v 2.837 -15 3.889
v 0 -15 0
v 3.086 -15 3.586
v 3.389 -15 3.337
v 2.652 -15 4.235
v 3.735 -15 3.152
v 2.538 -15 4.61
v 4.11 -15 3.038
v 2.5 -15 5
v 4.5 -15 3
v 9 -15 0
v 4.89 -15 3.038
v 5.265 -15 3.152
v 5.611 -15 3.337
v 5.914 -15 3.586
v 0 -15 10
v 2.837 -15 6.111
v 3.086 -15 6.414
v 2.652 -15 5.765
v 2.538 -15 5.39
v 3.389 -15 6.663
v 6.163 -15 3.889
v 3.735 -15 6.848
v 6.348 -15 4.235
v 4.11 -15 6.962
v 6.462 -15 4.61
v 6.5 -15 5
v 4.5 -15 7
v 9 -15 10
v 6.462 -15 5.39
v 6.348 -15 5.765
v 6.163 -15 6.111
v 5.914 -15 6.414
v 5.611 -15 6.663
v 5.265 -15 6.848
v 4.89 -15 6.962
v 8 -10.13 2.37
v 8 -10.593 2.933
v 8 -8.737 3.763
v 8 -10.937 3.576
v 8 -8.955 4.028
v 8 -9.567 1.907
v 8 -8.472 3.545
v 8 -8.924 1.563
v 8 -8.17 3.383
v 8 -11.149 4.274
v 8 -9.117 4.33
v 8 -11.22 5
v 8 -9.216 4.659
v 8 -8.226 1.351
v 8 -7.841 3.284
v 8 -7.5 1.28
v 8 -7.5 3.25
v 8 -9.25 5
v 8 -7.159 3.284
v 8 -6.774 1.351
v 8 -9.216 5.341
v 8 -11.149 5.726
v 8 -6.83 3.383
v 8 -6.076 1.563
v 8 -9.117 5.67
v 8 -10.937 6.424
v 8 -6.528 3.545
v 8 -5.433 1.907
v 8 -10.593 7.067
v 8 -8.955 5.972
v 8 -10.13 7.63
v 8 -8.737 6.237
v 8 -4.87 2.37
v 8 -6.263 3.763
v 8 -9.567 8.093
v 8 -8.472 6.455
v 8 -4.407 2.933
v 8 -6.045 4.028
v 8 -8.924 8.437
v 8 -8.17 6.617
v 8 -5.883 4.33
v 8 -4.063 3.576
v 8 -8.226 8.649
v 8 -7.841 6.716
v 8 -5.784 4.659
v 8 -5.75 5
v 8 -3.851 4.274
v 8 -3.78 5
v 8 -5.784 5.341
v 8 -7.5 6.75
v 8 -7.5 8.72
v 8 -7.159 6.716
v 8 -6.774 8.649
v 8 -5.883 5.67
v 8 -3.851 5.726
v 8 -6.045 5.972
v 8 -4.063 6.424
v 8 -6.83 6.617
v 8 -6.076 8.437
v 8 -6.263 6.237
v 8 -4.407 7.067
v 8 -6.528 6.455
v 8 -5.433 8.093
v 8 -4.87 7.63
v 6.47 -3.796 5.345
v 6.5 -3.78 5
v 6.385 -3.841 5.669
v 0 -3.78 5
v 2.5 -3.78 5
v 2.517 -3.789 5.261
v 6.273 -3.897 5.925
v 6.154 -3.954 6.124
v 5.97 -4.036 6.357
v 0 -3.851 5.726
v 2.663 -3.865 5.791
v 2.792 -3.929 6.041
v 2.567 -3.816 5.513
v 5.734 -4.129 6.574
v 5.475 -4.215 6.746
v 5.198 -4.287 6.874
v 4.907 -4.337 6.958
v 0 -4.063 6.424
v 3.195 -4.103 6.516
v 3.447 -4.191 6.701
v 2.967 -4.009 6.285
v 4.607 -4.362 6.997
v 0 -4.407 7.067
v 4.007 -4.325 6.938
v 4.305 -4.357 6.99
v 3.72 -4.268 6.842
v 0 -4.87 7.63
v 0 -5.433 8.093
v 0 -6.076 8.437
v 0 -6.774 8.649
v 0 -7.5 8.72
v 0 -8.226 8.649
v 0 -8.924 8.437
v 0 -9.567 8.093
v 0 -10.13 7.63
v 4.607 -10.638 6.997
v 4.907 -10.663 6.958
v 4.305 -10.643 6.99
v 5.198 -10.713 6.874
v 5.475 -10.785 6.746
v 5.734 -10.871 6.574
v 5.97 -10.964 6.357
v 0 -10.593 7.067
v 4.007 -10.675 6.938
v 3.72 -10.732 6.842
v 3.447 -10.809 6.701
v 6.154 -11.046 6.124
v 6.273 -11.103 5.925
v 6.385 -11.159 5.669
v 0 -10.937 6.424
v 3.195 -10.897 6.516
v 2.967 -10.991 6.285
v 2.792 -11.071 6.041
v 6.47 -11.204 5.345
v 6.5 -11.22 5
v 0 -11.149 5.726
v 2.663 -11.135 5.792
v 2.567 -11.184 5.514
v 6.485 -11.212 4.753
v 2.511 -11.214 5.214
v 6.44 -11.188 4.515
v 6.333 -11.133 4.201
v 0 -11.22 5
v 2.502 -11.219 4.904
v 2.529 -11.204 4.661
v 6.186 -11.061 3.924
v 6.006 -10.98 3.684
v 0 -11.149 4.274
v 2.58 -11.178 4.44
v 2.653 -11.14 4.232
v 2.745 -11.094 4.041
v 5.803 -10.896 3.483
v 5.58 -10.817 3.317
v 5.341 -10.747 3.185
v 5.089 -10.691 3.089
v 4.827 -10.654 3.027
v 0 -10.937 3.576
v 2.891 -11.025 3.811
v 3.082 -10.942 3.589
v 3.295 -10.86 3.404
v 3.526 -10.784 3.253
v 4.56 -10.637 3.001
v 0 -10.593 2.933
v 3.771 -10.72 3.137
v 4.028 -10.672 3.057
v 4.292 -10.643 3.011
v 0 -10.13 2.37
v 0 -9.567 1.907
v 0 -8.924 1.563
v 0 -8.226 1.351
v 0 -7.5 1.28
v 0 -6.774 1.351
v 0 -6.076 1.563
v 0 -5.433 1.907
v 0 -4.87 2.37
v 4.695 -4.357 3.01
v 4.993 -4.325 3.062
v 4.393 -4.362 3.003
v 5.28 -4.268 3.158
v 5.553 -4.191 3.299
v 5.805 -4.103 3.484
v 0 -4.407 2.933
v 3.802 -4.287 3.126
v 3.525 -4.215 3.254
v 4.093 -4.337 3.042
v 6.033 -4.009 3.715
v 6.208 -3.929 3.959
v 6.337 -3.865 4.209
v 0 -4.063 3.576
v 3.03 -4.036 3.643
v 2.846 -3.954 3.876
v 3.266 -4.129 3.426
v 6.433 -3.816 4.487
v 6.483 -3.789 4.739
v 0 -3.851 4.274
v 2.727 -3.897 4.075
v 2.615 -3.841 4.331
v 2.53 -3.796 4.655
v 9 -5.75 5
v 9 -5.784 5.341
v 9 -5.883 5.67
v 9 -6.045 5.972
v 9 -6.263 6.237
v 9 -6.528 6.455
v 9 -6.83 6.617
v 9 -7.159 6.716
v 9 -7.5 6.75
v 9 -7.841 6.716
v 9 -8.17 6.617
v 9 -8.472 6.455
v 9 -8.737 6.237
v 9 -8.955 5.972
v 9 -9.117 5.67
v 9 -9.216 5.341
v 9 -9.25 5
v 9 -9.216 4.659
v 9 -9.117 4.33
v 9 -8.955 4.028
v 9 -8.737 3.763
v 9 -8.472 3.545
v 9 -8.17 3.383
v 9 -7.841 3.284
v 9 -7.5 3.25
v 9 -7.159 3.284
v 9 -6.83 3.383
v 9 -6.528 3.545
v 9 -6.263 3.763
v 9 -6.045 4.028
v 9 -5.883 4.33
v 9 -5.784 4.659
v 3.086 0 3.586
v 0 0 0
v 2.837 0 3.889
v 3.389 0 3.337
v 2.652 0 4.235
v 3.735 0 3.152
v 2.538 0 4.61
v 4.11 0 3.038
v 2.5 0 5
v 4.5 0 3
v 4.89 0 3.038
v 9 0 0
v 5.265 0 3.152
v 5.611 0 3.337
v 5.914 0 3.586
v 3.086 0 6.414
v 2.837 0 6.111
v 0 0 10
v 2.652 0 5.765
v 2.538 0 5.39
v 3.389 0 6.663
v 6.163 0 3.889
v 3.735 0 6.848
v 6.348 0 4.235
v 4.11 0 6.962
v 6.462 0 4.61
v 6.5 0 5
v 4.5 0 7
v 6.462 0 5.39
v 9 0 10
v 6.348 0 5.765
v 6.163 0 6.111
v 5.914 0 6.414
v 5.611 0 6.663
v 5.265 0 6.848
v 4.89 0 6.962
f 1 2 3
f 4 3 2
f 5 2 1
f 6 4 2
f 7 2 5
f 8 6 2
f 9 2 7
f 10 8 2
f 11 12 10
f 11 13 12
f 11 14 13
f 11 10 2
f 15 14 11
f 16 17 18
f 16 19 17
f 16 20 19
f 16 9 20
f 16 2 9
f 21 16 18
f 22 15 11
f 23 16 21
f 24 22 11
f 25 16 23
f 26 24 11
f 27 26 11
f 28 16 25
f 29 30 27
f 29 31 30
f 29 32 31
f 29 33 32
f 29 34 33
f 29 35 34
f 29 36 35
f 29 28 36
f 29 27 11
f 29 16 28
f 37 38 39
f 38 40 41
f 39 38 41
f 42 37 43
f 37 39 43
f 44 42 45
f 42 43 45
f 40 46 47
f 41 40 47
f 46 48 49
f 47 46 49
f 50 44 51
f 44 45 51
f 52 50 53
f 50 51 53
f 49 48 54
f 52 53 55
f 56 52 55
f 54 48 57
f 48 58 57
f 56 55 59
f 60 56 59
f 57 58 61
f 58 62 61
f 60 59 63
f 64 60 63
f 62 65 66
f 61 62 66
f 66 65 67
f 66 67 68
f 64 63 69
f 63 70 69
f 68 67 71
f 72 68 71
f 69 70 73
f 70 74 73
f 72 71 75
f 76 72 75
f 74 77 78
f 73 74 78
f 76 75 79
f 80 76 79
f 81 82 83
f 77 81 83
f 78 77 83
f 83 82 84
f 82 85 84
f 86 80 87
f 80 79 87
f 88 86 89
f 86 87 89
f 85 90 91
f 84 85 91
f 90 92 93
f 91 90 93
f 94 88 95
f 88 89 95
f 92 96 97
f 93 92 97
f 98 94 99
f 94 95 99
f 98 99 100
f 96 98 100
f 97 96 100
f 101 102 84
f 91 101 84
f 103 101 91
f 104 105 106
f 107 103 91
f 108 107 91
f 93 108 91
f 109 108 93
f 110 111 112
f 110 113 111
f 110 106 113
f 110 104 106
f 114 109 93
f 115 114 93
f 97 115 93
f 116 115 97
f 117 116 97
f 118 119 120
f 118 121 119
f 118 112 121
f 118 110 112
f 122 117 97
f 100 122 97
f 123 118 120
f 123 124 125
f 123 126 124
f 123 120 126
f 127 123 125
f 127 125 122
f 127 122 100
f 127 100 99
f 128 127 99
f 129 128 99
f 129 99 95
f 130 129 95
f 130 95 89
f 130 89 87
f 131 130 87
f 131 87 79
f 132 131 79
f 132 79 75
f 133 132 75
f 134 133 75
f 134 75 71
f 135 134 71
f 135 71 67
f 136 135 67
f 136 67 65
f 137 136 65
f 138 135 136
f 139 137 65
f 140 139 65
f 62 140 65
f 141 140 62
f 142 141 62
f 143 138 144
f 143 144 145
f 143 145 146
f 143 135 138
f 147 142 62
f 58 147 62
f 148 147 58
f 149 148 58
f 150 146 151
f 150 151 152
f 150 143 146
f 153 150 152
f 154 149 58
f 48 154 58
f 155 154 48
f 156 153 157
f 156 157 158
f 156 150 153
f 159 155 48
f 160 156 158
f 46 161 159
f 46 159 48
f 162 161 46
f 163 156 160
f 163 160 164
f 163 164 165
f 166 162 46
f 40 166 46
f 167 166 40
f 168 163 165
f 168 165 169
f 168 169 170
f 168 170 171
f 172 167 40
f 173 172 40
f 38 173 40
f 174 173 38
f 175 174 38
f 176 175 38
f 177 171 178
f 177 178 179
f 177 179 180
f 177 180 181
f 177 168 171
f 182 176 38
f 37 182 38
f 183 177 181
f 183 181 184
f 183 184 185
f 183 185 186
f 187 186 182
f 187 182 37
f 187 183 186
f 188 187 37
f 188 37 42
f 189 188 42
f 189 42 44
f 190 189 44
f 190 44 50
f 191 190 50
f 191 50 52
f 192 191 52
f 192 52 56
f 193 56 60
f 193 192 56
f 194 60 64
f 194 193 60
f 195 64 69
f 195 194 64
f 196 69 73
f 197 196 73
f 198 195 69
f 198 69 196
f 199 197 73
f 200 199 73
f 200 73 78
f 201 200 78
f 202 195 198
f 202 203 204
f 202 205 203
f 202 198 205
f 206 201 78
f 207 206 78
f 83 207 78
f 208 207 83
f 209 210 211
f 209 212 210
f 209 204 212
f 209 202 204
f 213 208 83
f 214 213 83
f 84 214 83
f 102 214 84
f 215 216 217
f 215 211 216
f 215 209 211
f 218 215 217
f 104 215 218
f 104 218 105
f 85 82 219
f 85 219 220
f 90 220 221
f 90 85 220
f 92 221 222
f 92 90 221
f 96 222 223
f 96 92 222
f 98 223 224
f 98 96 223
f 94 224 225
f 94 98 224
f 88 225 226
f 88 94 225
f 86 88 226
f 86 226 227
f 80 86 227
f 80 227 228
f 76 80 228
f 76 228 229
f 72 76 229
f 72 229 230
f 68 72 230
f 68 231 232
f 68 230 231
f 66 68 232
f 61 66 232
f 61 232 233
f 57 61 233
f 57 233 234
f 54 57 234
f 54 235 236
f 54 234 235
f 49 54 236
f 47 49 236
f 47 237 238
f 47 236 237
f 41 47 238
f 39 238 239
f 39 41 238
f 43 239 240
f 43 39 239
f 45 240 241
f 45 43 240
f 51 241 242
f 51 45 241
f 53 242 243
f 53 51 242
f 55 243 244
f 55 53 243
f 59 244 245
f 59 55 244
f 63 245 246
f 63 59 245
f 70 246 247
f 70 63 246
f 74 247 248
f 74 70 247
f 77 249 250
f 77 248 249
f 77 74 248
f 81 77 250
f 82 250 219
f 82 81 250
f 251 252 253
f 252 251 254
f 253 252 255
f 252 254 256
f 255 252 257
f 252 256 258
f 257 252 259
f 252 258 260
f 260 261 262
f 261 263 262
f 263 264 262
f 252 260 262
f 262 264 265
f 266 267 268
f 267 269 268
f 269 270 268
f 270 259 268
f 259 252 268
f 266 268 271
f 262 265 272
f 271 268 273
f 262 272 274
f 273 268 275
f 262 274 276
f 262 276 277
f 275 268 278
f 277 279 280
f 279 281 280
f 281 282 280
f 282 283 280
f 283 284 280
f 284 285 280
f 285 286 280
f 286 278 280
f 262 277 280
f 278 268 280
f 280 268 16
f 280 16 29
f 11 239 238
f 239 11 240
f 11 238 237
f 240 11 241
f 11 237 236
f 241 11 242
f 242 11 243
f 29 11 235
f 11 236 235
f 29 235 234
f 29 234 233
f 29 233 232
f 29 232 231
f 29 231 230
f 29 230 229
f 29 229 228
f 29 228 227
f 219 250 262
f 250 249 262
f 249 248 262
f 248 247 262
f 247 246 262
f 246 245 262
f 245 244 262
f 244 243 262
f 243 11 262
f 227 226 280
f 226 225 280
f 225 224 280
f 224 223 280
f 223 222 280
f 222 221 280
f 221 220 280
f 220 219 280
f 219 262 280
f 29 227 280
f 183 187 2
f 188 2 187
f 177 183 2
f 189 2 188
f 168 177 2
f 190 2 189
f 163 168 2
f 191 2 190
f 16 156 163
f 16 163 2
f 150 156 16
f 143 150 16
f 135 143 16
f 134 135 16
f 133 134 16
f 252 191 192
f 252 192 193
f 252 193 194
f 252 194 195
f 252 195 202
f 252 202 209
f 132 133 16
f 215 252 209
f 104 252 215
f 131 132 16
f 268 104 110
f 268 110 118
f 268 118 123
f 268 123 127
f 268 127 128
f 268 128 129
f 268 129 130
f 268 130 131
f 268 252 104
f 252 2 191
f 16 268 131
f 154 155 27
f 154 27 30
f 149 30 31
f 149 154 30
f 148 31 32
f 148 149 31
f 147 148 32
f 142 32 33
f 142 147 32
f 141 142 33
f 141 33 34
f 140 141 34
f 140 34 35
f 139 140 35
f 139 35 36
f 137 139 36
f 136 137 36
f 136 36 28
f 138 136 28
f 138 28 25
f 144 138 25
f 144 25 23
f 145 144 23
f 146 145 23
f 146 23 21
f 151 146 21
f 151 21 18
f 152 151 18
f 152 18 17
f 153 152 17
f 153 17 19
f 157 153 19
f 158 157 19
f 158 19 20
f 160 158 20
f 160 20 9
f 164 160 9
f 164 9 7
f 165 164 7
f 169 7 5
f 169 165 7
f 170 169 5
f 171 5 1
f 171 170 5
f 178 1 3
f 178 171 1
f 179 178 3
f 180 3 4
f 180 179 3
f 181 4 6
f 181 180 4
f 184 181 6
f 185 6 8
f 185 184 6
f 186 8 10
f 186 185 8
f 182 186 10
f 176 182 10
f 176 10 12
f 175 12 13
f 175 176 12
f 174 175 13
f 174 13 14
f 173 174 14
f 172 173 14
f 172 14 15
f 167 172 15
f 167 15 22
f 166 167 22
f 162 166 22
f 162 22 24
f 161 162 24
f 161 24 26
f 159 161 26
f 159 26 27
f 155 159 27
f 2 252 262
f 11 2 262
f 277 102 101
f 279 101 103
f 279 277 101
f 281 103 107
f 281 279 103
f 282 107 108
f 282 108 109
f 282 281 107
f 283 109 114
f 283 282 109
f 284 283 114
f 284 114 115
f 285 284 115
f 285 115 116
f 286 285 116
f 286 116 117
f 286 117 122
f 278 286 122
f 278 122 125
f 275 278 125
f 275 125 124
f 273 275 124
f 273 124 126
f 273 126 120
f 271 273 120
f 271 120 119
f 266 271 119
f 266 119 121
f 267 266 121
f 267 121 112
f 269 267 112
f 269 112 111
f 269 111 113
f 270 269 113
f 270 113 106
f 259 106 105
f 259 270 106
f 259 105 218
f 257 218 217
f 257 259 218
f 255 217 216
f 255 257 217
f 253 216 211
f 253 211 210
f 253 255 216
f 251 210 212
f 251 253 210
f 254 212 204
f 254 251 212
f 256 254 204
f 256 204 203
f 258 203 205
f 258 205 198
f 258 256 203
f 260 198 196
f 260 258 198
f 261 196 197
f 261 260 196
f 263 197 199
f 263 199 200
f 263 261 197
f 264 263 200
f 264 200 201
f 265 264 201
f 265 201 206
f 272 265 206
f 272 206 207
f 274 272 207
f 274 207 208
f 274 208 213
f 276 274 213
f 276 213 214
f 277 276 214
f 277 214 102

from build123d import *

# Parameters (mm, degrees)
SKETCH014_W     = 9
SKETCH014_H     = 10
SKETCH014_R     = 2
PAD009_DEPTH    = 15
SKETCH015_R     = 1.75
POCKET002_DEPTH = 9.001
SKETCH016_R     = 3.72
POCKET003_DEPTH = 8


with BuildPart() as part:
    # Sketch014 → Pad009 (new body)
    with BuildSketch(Plane.XZ):
        with Locations((4.5, 5)):
            Rectangle(SKETCH014_W, SKETCH014_H)
        with Locations((4.5, 5)):
            Circle(SKETCH014_R, mode=Mode.SUBTRACT)
    extrude(amount=PAD009_DEPTH)

    # Sketch015 → Pocket002 (cut, through all)
    with BuildSketch(Plane.YZ):
        with Locations((-7.5, 5)):
            Circle(SKETCH015_R)
    extrude(amount=POCKET002_DEPTH, mode=Mode.SUBTRACT)

    # Sketch016 → Pocket003 (cut)
    with BuildSketch(Plane.YZ):
        with Locations((-7.5, 5)):
            Circle(SKETCH016_R)
    extrude(amount=POCKET003_DEPTH, mode=Mode.SUBTRACT)


solid = part.part
